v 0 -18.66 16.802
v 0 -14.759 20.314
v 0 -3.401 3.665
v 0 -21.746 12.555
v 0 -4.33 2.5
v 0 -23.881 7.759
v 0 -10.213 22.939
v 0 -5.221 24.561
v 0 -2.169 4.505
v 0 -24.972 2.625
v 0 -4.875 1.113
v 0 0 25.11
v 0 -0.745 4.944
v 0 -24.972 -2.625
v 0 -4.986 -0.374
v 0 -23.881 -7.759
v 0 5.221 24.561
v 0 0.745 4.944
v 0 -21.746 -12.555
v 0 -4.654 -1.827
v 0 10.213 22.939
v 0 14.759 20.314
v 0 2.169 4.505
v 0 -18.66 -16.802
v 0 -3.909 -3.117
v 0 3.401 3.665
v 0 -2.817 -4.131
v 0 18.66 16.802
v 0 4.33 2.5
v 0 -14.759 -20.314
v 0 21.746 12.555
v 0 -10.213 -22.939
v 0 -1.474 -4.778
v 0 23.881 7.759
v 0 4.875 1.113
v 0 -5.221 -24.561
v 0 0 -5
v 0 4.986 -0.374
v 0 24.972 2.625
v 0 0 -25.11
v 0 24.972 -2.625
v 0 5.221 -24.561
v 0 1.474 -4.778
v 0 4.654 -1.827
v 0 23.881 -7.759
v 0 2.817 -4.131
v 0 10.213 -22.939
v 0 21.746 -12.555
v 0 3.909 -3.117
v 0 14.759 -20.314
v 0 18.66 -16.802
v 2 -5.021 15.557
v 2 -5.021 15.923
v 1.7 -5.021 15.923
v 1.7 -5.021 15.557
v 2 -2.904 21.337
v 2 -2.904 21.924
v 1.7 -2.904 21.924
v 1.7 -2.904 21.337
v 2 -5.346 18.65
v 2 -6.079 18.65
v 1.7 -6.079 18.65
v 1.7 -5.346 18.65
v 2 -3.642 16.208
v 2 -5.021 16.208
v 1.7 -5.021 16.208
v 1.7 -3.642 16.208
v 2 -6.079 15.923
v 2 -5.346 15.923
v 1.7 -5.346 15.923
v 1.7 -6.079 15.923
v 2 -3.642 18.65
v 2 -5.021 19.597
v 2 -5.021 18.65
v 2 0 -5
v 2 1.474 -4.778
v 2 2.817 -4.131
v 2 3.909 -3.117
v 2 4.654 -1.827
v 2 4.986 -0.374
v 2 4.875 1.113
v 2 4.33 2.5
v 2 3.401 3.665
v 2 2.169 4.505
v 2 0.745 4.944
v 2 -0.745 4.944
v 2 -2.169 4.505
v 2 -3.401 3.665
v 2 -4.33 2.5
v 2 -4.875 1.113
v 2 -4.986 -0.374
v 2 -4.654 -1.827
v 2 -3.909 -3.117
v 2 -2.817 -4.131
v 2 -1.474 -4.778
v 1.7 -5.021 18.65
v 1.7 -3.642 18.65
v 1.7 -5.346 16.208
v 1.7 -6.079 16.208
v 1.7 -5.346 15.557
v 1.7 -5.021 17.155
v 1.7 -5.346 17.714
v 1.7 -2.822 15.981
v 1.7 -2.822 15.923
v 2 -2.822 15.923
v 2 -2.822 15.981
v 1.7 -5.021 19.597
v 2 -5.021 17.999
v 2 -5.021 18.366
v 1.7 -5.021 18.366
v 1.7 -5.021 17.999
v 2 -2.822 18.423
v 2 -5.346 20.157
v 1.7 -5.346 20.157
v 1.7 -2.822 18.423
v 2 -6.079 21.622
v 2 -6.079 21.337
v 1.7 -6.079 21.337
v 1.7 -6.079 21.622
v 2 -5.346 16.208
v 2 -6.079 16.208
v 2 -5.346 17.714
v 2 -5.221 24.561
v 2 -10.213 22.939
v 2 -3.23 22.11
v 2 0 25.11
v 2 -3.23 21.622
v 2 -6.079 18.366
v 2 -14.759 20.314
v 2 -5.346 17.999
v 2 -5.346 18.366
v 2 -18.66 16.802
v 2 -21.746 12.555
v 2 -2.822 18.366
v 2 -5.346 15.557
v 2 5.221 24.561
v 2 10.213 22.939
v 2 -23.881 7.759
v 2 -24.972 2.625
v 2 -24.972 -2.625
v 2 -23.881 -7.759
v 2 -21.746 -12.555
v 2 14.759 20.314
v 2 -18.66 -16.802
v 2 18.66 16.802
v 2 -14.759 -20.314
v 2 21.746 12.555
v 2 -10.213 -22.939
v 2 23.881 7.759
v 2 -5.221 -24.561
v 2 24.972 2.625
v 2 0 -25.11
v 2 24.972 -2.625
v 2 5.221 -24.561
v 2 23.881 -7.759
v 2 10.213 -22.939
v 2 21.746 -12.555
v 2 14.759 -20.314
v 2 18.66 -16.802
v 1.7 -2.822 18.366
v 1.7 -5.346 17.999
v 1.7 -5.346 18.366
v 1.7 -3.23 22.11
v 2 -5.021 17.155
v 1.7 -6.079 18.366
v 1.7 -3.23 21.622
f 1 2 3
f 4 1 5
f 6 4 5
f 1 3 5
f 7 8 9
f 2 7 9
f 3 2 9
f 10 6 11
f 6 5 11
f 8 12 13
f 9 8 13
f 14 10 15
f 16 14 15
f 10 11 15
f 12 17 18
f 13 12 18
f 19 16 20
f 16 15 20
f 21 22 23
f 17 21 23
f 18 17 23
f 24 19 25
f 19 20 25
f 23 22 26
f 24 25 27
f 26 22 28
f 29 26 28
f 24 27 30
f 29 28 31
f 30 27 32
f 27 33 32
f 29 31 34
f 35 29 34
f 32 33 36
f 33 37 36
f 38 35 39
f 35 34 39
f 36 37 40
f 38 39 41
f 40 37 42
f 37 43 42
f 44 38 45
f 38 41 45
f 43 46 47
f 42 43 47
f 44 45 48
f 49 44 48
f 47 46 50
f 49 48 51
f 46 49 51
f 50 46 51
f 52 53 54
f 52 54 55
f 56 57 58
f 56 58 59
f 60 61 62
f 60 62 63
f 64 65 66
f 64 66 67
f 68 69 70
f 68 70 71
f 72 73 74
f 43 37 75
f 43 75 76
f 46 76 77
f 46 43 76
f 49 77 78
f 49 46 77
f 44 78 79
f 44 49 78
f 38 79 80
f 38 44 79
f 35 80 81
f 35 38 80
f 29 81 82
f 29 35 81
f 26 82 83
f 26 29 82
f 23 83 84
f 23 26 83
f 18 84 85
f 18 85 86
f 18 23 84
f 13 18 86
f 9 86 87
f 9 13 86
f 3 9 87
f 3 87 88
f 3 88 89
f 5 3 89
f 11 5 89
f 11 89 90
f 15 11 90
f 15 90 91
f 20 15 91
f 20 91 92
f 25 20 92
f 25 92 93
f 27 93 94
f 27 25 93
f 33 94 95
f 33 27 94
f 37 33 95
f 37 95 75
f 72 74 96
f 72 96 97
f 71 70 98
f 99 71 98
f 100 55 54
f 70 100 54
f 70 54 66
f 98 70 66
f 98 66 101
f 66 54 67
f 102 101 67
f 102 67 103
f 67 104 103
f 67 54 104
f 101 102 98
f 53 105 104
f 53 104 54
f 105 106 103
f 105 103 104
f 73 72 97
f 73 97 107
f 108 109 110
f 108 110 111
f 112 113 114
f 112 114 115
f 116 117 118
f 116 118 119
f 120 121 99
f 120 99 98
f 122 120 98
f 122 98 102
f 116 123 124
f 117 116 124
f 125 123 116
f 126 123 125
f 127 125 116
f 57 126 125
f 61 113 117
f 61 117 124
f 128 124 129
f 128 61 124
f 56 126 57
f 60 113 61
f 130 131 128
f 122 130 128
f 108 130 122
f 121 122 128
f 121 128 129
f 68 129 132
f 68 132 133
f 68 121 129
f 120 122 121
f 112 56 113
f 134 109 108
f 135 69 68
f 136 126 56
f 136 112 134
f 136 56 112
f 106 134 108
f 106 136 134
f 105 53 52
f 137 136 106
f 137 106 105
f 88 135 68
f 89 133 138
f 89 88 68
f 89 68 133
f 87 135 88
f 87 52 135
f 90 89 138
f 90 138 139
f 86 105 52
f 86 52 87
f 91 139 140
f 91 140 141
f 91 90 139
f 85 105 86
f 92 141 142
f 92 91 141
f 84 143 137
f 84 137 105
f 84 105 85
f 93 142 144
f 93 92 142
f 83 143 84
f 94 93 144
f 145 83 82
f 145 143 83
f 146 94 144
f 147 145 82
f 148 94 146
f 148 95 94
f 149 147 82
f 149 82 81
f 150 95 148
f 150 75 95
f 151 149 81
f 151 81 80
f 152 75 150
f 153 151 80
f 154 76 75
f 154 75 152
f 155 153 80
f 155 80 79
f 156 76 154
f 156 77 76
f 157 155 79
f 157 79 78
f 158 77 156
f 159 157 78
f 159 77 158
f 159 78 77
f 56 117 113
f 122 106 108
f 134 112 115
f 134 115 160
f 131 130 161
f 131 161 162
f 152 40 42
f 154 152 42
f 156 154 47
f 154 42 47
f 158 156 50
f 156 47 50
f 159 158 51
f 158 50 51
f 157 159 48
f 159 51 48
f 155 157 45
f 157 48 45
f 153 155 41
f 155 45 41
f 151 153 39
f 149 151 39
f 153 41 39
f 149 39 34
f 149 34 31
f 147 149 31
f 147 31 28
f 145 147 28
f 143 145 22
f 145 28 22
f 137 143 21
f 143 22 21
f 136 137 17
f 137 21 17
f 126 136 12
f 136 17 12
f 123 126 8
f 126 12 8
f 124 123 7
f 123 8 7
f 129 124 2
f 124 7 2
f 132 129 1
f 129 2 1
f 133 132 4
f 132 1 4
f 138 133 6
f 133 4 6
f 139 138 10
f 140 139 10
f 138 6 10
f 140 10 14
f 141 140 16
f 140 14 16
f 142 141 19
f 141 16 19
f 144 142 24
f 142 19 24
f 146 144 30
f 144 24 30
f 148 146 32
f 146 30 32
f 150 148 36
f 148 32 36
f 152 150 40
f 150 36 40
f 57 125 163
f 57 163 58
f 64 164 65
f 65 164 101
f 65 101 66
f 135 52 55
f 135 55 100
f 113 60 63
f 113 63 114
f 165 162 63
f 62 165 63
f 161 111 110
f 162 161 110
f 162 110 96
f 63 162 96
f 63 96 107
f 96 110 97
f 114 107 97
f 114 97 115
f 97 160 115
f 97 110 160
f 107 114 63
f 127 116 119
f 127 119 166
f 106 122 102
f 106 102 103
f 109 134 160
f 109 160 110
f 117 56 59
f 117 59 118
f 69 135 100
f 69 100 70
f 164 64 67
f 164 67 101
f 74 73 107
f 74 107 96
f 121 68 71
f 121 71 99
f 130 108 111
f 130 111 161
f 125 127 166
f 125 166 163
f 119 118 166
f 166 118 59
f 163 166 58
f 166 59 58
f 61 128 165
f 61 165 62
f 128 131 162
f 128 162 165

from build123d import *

# Parameters (mm, degrees)
SKETCH1_R           = 25.11
SKETCH1_R_2         = 5
BOSS_EXTRUDE1_DEPTH = 2
CUT_EXTRUDE2_DEPTH  = 0.3


with BuildPart() as part:
    # Sketch1 → Boss-Extrude1 (new body)
    with BuildSketch(Plane(origin=(0, 0, 0), x_dir=(0, 0, -1), z_dir=(1, 0, 0))):
        Circle(SKETCH1_R)
        Circle(SKETCH1_R_2, mode=Mode.SUBTRACT)
    extrude(amount=BOSS_EXTRUDE1_DEPTH)

    # Sketch3 → Cut-Extrude2 (cut)
    # profile 1 of 3: a face of its own
    with BuildSketch(Plane(origin=(2, 0, 0), x_dir=(0, 0, -1), z_dir=(1, 0, 0))):
        Polygon((-21.924071507, -2.903864462), (-21.337027236, -2.903864462), (-21.337027236, -6.078864462), (-21.621963134, -6.078864462), (-21.621963134, -3.229505488), (-22.110424672, -3.229505488), align=None)
    # profile 2 of 3: a face of its own
    with BuildSketch(Plane(origin=(2, 0, 0), x_dir=(0, 0, -1), z_dir=(1, 0, 0))):
        Polygon((-18.423430481, -2.822454205), (-18.365552877, -2.822454205), (-18.365552877, -5.020531129), (-17.999206723, -5.020531129), (-17.999206723, -5.346172154), (-18.365552877, -5.346172154), (-18.365552877, -6.078864462), (-18.650488775, -6.078864462), (-18.650488775, -5.346172154), (-20.156578518, -5.346172154), align=None)
        Polygon((-18.650488775, -5.020531129), (-18.650488775, -3.641644911), (-19.596883005, -5.020531129), align=None, mode=Mode.SUBTRACT)
    # profile 3 of 3: a face of its own
    with BuildSketch(Plane(origin=(2, 0, 0), x_dir=(0, 0, -1), z_dir=(1, 0, 0))):
        Polygon((-15.981122789, -2.822454205), (-15.923245185, -2.822454205), (-15.923245185, -5.020531129), (-15.556899031, -5.020531129), (-15.556899031, -5.346172154), (-15.923245185, -5.346172154), (-15.923245185, -6.078864462), (-16.208181082, -6.078864462), (-16.208181082, -5.346172154), (-17.714270826, -5.346172154), align=None)
        Polygon((-16.208181082, -5.020531129), (-16.208181082, -3.641644911), (-17.154575313, -5.020531129), align=None, mode=Mode.SUBTRACT)
    extrude(amount=-CUT_EXTRUDE2_DEPTH, mode=Mode.SUBTRACT)


solid = part.part
